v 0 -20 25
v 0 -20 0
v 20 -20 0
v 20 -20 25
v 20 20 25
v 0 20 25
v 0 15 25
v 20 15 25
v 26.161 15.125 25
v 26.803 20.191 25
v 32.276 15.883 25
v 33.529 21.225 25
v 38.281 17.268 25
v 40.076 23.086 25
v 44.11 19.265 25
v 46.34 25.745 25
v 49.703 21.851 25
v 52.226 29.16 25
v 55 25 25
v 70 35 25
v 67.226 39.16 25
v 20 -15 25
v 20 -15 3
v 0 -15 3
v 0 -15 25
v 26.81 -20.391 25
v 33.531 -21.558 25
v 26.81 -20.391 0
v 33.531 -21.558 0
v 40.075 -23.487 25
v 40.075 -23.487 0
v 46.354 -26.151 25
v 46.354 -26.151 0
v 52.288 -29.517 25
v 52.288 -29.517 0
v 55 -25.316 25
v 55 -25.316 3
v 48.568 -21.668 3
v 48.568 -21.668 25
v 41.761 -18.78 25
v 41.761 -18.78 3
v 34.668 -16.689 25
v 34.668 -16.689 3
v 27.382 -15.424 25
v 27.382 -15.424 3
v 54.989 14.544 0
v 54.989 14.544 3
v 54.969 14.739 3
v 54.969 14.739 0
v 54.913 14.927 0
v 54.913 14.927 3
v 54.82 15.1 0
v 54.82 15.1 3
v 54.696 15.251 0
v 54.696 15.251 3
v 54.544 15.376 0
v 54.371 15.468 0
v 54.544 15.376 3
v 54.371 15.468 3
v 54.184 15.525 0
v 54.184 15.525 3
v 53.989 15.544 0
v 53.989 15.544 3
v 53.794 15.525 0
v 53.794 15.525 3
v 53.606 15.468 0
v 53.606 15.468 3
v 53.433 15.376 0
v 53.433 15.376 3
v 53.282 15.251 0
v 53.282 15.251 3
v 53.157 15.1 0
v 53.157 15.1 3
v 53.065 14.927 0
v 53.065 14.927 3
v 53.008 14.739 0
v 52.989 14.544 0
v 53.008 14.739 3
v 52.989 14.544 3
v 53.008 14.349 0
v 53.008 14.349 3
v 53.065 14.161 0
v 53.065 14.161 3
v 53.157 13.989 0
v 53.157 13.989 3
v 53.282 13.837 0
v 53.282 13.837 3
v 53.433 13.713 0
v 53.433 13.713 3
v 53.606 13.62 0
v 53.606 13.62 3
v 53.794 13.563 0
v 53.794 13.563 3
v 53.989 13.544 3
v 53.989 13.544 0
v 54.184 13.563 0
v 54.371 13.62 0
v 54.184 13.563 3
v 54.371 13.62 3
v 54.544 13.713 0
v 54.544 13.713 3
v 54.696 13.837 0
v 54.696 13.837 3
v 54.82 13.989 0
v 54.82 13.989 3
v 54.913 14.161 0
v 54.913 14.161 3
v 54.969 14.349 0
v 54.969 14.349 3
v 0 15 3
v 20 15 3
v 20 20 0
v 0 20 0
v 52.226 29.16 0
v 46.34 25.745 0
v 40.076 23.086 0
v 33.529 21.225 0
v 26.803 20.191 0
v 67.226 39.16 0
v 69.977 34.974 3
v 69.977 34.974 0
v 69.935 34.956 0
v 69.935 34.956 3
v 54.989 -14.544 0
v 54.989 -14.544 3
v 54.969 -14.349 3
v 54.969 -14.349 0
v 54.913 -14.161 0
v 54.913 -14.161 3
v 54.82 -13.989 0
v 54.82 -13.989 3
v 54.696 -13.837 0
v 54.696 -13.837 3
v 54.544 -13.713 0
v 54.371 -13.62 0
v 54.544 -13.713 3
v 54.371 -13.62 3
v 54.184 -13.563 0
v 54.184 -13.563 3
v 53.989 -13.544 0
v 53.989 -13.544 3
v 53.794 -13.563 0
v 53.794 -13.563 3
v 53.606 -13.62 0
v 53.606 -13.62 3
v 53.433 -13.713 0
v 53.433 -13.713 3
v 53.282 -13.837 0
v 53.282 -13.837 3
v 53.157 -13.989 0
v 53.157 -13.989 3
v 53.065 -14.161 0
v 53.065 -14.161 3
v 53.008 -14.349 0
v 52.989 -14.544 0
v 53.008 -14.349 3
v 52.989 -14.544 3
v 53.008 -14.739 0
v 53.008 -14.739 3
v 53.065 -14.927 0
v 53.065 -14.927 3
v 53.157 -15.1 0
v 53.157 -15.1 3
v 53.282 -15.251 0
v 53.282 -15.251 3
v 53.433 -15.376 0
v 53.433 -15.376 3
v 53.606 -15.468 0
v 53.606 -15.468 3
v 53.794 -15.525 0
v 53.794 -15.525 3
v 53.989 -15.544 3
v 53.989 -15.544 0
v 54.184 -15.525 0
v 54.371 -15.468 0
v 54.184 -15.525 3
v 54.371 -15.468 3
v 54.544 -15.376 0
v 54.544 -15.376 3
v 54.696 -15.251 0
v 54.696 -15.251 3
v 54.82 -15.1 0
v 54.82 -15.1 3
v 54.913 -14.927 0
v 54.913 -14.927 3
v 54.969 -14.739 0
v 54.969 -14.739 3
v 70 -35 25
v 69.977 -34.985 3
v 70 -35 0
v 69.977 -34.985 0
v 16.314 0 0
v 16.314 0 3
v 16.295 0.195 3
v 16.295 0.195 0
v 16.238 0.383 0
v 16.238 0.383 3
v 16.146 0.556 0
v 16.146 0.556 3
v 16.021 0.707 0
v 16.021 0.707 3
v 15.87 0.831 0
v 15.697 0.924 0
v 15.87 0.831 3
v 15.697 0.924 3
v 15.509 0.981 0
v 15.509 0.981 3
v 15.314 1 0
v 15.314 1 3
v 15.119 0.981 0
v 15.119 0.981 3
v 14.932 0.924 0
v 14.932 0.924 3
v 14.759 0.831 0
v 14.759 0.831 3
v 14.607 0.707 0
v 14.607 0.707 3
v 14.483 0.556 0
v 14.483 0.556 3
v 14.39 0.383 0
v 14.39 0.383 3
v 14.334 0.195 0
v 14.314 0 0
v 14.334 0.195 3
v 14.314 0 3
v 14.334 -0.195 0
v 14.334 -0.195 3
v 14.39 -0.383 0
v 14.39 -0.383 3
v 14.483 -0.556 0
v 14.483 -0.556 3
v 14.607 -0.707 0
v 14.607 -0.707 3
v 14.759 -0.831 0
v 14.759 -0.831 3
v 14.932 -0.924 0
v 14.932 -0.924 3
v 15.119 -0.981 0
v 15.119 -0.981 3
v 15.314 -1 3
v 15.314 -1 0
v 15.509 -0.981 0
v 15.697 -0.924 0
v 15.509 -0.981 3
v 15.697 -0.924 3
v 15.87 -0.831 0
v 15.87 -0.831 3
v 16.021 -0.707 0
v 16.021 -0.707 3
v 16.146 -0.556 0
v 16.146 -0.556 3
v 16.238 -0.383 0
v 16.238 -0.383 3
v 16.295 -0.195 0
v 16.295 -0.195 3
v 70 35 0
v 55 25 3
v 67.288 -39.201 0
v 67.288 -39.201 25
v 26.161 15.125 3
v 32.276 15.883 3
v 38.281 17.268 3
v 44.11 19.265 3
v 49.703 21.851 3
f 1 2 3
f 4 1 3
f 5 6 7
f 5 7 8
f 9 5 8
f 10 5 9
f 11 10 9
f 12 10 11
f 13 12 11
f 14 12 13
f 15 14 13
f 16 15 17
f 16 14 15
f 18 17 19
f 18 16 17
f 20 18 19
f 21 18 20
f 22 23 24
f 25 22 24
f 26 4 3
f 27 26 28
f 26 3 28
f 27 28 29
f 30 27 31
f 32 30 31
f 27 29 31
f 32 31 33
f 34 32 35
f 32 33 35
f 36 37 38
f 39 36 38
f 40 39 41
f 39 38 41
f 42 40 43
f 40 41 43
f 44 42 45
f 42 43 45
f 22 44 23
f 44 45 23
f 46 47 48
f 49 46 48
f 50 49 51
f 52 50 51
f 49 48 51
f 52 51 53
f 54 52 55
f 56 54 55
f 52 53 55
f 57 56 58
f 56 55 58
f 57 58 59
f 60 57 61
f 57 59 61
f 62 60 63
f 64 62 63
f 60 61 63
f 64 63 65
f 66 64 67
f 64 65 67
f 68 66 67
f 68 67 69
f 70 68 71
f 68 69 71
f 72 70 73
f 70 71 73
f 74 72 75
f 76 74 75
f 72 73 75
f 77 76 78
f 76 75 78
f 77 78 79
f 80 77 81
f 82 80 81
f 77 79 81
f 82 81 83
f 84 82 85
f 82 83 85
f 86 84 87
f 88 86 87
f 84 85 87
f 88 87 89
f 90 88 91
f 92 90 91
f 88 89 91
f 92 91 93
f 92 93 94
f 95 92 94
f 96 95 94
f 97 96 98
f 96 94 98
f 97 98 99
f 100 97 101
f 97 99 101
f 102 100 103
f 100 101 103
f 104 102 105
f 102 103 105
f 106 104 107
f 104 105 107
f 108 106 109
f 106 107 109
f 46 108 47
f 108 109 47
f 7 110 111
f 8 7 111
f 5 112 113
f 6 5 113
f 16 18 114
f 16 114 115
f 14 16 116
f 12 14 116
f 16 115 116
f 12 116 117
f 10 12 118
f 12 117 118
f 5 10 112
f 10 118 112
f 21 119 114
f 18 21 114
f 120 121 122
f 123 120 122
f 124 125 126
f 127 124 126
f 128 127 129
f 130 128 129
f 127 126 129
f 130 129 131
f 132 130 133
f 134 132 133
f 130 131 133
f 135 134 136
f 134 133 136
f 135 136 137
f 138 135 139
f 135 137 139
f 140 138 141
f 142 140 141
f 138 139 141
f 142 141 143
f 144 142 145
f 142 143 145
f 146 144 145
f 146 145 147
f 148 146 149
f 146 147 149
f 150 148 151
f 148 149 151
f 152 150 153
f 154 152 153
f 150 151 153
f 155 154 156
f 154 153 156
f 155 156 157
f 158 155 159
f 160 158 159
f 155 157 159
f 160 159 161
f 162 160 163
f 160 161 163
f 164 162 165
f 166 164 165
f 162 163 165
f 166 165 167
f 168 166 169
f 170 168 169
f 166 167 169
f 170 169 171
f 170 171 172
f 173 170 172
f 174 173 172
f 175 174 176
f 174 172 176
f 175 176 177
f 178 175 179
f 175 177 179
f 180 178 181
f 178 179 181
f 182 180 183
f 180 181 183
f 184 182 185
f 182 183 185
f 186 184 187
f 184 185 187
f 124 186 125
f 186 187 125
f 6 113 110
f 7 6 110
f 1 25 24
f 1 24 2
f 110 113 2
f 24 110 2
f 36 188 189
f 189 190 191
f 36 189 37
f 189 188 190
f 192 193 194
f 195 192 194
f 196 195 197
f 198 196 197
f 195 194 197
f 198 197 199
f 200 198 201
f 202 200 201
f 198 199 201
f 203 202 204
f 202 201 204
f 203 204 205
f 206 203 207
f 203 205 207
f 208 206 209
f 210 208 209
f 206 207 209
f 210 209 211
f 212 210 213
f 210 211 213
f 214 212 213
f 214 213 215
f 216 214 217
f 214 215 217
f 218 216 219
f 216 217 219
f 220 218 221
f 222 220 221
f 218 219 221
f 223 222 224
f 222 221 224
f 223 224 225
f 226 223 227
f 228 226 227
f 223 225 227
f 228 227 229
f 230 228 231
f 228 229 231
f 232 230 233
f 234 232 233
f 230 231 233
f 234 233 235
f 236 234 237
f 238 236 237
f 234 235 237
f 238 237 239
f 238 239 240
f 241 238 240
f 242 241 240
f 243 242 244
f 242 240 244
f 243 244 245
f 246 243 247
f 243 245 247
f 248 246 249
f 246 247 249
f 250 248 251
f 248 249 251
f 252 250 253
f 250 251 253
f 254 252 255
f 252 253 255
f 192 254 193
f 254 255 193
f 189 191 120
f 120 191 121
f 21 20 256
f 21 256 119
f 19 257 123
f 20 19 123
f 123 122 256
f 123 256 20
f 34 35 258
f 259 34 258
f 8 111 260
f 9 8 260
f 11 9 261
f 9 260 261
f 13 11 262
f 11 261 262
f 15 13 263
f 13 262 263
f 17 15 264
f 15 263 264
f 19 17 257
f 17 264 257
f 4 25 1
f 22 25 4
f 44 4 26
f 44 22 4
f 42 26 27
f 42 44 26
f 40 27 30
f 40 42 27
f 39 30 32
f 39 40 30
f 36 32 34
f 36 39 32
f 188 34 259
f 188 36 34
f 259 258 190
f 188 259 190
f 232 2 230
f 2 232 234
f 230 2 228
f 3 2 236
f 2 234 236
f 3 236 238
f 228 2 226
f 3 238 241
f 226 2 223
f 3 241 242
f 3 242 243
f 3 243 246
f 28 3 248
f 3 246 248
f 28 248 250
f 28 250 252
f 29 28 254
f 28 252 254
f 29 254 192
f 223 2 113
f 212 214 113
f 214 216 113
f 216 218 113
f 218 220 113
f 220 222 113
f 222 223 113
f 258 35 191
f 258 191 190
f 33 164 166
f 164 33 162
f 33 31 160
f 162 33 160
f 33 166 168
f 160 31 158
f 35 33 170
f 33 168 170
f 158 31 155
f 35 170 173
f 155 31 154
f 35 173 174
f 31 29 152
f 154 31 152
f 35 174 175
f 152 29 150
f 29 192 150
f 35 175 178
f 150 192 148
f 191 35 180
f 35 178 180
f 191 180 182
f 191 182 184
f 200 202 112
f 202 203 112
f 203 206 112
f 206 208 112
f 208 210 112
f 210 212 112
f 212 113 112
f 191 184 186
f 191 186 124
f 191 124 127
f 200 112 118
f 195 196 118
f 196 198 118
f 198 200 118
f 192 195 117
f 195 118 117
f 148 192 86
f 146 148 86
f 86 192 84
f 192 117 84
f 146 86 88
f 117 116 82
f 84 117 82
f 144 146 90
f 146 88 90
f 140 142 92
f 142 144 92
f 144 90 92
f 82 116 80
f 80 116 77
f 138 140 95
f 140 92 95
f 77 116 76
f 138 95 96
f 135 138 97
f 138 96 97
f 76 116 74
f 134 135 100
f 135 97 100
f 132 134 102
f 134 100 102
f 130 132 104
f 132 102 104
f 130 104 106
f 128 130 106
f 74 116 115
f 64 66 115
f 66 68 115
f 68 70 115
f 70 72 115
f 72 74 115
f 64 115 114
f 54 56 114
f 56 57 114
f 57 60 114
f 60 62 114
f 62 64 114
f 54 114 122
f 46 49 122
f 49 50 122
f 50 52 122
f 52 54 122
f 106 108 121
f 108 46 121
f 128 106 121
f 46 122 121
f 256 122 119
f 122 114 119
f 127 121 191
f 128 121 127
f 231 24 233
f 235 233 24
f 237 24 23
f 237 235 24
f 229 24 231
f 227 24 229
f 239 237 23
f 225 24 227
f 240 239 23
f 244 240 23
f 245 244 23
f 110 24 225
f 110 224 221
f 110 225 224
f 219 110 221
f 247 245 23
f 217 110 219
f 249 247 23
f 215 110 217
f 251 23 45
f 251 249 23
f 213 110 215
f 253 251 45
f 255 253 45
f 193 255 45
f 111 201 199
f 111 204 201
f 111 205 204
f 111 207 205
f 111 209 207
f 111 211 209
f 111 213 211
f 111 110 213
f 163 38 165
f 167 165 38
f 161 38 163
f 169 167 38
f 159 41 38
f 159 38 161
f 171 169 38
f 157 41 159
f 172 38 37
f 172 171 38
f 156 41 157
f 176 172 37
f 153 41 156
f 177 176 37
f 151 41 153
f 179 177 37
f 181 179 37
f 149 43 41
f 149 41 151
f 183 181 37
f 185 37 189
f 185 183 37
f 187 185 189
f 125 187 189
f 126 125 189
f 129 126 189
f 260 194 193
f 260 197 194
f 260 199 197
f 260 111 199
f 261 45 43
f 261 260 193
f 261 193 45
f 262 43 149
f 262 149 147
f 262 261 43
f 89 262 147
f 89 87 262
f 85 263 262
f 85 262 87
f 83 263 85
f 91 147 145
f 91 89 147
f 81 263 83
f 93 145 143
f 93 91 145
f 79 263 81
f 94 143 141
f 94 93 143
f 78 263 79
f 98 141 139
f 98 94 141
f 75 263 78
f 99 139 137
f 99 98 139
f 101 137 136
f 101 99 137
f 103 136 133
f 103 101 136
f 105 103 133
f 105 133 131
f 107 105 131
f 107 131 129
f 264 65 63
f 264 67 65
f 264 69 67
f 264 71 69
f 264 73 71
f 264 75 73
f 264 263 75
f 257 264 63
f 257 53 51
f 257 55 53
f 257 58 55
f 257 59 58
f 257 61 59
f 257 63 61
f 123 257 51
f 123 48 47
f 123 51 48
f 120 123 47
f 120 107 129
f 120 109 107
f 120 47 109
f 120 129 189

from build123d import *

# Parameters (mm, degrees)
F1_DEPTH = 25
F3_DEPTH = 3
F4_R     = 1
F5_DEPTH = 3


with BuildPart() as f1:
    # F0 (on Top) → F1 (new body)
    with BuildSketch(Plane.XY):
        with BuildLine():
            Line((0, 20), (0, 15))
            Line((0, 15), (20, 15))
            ThreePointArc((20, 15), (38.2805059355, 17.2682292257), (55, 25))
            Line((55, 25), (70, 35))
            Line((70, 35), (67.2264990189, 39.1602514717))
            Line((67.2264990189, 39.1602514717), (52.2264990189, 29.1602514717))
            ThreePointArc((52.2264990189, 29.1602514717), (36.8313987252, 22.0536192236), (20, 20))
            Line((20, 20), (0, 20))
        make_face()
    extrude(amount=F1_DEPTH)



with BuildPart() as f1b:
    # F0 (on Top) → F1, piece 2 (new body)
    with BuildSketch(Plane.XY):
        with BuildLine():
            Line((20, -15), (0, -15))
            Line((0, -15), (0, -20))
            Line((0, -20), (20, -20))
            ThreePointArc((20, -20), (36.8307254493, -22.4287692466), (52.2881087807, -29.516895921))
            Line((52.2881087807, -29.516895921), (67.2881087807, -39.2006720908))
            Line((67.2881087807, -39.2006720908), (70, -35))
            Line((70, -35), (55, -25.3162238302))
            ThreePointArc((55, -25.3162238302), (38.2443448369, -17.6327625507), (20, -15))
        make_face()
    extrude(amount=F1_DEPTH)


with BuildPart() as f1_1:
    add(f1.part)

    add(f1b.part)  # F3 merges F1b
    # F2 (on Top) → F3 (join)
    with BuildSketch(Plane.XY):
        Polygon((31.2723219395, 17.9464295506), (0, 17.5446420908), (0, -17.1428583562), (26.3169649988, -17.1428583562), (39.7098250687, -20.0892854482), (53.7723265588, -27.187500149), (69.9766278267, -34.9970981479), (69.9766278267, 34.9736848865), (58.1919662654, 30.1339291036), (44.7991117835, 22.7678567171), align=None)
    extrude(amount=F3_DEPTH)

    # F4 (on face) → F5 (cut)
    with BuildSketch(Plane.XY.offset(3)):
        with Locations((15.3143024072, 0)):
            Circle(F4_R)
        with Locations((53.9886541665, 14.5440837368)):
            Circle(F4_R)
        with Locations((53.9886541665, -14.5440837368)):
            Circle(F4_R)
    extrude(amount=-F5_DEPTH, mode=Mode.SUBTRACT)


solid = f1_1.part
